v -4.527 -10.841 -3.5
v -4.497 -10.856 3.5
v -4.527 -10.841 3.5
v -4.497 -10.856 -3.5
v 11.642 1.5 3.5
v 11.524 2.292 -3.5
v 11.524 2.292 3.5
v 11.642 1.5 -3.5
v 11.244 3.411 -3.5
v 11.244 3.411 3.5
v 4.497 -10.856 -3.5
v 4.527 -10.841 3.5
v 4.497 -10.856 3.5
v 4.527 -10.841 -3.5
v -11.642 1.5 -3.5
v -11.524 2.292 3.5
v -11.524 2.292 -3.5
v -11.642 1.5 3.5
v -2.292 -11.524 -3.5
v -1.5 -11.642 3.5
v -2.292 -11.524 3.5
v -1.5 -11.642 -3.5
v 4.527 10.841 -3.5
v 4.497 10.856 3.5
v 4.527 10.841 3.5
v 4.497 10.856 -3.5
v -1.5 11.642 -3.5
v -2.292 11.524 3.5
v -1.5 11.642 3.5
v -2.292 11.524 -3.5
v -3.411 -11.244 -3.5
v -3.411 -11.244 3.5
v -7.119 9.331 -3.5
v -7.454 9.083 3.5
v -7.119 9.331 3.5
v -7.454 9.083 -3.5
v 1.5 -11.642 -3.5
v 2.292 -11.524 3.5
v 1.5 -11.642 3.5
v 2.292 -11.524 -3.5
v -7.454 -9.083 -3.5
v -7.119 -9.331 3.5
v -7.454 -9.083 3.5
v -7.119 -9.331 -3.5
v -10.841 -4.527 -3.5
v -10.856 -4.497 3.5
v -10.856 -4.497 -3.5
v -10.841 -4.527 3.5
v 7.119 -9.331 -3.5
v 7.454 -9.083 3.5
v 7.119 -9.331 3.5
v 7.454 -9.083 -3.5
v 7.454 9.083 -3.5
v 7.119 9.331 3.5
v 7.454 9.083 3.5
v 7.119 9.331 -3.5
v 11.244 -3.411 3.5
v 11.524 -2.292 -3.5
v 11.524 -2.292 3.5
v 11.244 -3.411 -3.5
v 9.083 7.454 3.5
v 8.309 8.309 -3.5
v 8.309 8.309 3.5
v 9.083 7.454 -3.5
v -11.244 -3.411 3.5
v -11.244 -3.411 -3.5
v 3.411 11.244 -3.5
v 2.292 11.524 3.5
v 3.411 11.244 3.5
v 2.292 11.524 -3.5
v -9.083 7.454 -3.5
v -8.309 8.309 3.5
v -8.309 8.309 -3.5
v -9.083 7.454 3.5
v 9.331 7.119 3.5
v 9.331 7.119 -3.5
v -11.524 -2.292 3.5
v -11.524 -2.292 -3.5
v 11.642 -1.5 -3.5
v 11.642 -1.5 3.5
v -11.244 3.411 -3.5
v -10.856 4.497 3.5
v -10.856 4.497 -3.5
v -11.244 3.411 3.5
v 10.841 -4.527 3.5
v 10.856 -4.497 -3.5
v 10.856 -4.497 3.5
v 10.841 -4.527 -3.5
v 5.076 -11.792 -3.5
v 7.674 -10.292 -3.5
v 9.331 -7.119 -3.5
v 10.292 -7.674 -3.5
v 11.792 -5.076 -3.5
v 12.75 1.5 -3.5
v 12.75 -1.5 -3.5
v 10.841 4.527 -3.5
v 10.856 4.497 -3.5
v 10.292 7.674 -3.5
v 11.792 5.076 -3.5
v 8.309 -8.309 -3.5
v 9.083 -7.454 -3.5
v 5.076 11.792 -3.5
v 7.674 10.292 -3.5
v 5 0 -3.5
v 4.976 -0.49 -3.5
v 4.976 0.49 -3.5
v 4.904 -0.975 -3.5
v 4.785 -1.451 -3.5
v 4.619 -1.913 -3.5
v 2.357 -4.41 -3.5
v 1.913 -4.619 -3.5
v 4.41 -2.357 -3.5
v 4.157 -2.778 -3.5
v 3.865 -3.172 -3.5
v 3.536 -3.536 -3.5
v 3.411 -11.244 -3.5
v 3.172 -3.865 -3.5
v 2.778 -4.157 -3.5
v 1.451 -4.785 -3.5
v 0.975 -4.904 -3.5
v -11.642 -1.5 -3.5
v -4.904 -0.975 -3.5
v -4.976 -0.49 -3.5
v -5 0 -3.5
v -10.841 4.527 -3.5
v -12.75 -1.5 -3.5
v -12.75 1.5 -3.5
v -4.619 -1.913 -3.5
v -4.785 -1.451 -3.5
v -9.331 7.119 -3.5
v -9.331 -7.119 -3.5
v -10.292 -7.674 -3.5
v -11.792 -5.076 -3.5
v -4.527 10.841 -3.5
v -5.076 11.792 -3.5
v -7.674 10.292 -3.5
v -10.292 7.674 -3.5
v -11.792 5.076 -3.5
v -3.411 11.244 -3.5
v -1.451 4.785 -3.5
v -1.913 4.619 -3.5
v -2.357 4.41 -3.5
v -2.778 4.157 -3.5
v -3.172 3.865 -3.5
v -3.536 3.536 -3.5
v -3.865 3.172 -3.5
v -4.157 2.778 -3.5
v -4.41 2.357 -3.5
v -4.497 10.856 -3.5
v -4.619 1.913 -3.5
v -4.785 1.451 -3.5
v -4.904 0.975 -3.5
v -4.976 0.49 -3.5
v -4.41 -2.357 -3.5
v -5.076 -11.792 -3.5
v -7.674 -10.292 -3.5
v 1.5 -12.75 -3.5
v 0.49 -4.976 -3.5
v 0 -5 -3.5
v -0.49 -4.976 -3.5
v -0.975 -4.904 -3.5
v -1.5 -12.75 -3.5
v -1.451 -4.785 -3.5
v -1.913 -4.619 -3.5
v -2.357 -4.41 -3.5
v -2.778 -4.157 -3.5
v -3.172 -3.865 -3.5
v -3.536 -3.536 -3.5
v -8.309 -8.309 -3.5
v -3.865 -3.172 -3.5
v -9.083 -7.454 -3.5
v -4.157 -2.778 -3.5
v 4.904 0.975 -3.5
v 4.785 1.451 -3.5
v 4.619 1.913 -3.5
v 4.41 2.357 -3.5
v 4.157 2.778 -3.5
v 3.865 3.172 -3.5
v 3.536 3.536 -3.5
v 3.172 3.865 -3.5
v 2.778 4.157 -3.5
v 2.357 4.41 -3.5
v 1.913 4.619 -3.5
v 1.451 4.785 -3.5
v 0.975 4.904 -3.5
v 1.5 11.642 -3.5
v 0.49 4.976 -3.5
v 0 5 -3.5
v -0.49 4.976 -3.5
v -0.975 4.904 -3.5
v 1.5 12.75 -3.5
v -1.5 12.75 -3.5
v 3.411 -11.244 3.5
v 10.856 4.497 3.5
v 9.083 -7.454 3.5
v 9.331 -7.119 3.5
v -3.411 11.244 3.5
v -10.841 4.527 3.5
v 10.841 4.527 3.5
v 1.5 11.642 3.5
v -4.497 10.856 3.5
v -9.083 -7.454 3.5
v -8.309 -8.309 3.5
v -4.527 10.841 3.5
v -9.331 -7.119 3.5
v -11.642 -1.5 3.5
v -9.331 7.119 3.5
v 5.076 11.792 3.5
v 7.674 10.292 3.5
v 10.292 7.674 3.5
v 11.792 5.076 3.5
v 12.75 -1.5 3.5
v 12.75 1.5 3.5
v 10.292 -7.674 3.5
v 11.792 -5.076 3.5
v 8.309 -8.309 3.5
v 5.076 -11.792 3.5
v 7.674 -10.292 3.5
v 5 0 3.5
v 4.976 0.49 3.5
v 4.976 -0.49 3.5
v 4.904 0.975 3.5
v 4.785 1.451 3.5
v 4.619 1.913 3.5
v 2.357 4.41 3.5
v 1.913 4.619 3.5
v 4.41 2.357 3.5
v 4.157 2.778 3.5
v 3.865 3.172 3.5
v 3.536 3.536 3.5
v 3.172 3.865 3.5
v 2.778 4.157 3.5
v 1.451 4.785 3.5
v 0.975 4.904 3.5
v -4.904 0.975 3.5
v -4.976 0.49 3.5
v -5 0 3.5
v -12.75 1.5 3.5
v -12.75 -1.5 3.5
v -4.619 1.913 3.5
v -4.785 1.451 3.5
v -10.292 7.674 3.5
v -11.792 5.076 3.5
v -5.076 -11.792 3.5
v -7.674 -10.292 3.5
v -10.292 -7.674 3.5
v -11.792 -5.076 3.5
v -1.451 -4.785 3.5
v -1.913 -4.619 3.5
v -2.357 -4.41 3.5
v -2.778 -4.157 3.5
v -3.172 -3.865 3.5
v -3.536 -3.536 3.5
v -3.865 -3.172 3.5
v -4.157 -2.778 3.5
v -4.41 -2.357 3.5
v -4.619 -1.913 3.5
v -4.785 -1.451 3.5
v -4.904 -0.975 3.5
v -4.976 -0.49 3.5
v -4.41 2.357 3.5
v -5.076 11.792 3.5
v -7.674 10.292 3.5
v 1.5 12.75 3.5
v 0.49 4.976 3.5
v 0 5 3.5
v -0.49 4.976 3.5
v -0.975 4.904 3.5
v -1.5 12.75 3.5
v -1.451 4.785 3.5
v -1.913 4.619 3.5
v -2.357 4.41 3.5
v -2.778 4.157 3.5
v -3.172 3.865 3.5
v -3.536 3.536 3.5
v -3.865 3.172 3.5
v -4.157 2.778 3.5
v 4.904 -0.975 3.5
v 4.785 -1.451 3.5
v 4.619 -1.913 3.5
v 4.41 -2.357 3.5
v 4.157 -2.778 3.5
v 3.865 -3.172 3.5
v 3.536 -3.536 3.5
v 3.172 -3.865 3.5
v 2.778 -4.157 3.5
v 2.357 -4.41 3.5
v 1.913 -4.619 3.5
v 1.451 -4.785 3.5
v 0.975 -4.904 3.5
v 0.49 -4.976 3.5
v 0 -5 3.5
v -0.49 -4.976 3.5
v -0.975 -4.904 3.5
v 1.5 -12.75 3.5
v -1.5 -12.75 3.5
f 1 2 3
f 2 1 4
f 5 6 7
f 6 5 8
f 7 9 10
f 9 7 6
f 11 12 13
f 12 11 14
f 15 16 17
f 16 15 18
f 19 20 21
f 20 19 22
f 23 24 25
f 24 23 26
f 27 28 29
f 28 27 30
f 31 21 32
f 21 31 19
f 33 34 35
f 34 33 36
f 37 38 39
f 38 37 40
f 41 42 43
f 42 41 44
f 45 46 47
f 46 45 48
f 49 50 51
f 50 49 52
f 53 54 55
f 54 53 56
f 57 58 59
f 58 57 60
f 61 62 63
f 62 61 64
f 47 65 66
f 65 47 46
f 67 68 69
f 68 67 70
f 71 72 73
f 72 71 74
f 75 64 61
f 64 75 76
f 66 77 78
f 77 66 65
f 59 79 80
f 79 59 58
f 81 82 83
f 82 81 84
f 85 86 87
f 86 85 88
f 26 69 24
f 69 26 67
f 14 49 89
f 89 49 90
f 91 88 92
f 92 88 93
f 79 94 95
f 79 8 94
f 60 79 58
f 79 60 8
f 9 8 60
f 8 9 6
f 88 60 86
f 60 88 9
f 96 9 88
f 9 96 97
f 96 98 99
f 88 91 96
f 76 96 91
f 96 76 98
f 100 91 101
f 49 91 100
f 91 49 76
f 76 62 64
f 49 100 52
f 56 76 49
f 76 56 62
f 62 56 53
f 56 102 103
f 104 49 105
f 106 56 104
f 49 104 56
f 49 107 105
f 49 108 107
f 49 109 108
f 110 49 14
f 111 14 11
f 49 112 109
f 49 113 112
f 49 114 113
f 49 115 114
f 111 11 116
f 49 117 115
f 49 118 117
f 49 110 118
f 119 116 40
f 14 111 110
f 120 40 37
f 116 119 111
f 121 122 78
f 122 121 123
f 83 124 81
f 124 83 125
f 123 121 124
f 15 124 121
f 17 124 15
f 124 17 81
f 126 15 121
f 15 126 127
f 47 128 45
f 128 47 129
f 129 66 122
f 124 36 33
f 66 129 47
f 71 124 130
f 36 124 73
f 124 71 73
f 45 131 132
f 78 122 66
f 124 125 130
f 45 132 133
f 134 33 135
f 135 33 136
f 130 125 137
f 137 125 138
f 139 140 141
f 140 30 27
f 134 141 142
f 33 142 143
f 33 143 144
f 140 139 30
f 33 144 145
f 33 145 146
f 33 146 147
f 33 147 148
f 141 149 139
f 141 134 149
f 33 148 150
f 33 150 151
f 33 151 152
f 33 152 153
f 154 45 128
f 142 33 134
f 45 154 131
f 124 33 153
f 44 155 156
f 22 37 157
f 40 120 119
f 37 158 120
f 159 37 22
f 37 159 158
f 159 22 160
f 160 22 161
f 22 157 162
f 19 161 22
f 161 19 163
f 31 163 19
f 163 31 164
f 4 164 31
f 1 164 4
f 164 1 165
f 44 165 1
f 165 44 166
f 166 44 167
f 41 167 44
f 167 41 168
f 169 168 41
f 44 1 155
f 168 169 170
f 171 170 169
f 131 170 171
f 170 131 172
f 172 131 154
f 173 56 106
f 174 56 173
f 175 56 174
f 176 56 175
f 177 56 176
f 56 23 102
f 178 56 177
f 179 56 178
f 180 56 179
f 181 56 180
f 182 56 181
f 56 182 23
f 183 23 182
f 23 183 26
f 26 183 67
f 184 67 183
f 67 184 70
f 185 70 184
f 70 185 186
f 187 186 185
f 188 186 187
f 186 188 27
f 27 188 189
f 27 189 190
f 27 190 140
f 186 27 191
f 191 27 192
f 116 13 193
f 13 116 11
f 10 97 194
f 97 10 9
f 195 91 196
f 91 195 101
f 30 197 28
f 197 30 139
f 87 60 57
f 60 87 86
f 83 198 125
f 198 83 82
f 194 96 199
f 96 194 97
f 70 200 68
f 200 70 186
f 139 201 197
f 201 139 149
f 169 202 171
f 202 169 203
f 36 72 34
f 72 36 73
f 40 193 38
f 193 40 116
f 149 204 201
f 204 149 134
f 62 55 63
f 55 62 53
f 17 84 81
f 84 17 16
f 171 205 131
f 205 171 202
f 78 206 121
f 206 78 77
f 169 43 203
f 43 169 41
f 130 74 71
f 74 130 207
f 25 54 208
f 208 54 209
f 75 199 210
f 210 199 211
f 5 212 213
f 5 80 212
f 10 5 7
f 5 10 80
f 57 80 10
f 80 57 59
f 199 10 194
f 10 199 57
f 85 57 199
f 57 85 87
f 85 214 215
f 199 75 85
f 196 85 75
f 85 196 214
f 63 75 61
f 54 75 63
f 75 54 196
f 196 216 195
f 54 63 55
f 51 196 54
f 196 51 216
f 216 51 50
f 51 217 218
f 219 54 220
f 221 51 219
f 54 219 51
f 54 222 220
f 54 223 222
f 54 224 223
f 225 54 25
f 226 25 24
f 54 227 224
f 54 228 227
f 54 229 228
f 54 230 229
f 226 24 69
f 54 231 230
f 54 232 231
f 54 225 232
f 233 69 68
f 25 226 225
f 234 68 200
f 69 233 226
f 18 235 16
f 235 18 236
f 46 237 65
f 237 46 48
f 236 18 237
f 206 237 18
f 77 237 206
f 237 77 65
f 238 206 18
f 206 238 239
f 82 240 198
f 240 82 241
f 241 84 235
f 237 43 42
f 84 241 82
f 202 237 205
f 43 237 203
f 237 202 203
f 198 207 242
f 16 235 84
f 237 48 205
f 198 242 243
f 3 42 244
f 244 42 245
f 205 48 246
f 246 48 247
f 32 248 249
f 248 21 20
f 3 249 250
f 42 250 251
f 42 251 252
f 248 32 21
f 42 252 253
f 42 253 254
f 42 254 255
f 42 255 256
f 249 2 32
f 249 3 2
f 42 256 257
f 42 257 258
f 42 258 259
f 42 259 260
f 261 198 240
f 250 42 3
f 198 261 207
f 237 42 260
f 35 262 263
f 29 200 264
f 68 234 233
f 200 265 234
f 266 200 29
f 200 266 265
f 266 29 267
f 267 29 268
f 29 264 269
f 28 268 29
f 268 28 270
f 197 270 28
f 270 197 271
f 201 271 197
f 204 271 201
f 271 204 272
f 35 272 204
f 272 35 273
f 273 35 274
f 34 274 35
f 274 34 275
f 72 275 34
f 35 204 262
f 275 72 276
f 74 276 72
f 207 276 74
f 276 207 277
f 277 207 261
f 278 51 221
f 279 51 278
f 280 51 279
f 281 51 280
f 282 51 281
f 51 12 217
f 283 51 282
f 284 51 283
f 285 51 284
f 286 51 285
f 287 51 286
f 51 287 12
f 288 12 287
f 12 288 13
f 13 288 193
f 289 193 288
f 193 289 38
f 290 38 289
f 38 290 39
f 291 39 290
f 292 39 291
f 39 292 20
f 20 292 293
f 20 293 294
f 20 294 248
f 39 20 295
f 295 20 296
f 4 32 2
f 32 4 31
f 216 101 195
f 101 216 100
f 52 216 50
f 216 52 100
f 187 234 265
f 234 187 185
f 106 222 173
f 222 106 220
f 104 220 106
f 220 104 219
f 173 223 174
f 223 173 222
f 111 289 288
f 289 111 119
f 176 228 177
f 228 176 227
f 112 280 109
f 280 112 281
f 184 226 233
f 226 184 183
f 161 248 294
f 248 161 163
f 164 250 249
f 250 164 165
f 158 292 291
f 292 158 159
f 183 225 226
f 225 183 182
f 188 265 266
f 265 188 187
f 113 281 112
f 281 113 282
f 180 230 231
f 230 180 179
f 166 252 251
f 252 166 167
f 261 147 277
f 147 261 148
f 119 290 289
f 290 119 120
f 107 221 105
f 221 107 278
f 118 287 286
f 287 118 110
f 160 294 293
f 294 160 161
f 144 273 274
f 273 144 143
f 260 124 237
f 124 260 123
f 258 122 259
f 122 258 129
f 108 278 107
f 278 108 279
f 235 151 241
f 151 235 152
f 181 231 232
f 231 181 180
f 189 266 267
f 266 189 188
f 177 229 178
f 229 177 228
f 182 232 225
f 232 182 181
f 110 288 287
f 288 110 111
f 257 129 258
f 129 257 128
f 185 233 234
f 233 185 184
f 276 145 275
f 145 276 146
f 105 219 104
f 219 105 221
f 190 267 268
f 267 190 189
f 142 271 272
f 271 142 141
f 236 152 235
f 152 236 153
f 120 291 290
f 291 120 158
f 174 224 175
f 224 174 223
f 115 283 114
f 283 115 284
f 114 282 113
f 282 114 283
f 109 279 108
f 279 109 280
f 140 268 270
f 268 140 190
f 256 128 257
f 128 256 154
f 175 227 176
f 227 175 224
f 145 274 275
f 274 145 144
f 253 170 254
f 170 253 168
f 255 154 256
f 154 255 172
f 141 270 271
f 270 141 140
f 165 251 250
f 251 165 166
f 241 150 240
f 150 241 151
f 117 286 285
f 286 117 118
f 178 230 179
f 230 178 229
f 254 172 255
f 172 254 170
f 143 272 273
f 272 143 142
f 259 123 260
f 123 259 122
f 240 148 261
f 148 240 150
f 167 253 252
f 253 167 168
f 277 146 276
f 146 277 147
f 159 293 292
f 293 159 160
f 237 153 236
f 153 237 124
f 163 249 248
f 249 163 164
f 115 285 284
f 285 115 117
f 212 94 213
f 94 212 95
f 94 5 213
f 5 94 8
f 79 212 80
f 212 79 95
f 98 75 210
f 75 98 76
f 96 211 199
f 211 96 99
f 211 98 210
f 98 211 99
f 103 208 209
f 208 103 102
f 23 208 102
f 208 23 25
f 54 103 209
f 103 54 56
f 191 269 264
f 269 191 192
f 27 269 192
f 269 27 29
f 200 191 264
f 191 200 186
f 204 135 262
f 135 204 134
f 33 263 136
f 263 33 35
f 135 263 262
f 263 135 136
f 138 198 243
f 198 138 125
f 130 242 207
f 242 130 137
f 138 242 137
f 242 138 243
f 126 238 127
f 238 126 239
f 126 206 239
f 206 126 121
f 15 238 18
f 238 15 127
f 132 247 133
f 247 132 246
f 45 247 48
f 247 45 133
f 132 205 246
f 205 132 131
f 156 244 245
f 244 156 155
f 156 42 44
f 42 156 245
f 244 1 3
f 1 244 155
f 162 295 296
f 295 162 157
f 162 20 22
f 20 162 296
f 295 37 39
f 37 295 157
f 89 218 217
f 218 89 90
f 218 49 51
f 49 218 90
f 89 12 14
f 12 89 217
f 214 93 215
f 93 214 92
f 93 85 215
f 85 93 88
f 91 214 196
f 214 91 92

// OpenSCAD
module gear_tooth() {
    translate([11.75, 0, 0])
    cube([2, 3, 7], center=true);
}

module gear() {
    difference() {
        cylinder(d=23.5, h=7, center=true, $fn=64);
        cylinder(d=10, h=7, center=true, $fn=64);
    }
}

module toothed_gear() {
    gear();
    for (i = [0:11]) {
        rotate([0, 0, i * 30])
        gear_tooth();
    }
}

toothed_gear();
